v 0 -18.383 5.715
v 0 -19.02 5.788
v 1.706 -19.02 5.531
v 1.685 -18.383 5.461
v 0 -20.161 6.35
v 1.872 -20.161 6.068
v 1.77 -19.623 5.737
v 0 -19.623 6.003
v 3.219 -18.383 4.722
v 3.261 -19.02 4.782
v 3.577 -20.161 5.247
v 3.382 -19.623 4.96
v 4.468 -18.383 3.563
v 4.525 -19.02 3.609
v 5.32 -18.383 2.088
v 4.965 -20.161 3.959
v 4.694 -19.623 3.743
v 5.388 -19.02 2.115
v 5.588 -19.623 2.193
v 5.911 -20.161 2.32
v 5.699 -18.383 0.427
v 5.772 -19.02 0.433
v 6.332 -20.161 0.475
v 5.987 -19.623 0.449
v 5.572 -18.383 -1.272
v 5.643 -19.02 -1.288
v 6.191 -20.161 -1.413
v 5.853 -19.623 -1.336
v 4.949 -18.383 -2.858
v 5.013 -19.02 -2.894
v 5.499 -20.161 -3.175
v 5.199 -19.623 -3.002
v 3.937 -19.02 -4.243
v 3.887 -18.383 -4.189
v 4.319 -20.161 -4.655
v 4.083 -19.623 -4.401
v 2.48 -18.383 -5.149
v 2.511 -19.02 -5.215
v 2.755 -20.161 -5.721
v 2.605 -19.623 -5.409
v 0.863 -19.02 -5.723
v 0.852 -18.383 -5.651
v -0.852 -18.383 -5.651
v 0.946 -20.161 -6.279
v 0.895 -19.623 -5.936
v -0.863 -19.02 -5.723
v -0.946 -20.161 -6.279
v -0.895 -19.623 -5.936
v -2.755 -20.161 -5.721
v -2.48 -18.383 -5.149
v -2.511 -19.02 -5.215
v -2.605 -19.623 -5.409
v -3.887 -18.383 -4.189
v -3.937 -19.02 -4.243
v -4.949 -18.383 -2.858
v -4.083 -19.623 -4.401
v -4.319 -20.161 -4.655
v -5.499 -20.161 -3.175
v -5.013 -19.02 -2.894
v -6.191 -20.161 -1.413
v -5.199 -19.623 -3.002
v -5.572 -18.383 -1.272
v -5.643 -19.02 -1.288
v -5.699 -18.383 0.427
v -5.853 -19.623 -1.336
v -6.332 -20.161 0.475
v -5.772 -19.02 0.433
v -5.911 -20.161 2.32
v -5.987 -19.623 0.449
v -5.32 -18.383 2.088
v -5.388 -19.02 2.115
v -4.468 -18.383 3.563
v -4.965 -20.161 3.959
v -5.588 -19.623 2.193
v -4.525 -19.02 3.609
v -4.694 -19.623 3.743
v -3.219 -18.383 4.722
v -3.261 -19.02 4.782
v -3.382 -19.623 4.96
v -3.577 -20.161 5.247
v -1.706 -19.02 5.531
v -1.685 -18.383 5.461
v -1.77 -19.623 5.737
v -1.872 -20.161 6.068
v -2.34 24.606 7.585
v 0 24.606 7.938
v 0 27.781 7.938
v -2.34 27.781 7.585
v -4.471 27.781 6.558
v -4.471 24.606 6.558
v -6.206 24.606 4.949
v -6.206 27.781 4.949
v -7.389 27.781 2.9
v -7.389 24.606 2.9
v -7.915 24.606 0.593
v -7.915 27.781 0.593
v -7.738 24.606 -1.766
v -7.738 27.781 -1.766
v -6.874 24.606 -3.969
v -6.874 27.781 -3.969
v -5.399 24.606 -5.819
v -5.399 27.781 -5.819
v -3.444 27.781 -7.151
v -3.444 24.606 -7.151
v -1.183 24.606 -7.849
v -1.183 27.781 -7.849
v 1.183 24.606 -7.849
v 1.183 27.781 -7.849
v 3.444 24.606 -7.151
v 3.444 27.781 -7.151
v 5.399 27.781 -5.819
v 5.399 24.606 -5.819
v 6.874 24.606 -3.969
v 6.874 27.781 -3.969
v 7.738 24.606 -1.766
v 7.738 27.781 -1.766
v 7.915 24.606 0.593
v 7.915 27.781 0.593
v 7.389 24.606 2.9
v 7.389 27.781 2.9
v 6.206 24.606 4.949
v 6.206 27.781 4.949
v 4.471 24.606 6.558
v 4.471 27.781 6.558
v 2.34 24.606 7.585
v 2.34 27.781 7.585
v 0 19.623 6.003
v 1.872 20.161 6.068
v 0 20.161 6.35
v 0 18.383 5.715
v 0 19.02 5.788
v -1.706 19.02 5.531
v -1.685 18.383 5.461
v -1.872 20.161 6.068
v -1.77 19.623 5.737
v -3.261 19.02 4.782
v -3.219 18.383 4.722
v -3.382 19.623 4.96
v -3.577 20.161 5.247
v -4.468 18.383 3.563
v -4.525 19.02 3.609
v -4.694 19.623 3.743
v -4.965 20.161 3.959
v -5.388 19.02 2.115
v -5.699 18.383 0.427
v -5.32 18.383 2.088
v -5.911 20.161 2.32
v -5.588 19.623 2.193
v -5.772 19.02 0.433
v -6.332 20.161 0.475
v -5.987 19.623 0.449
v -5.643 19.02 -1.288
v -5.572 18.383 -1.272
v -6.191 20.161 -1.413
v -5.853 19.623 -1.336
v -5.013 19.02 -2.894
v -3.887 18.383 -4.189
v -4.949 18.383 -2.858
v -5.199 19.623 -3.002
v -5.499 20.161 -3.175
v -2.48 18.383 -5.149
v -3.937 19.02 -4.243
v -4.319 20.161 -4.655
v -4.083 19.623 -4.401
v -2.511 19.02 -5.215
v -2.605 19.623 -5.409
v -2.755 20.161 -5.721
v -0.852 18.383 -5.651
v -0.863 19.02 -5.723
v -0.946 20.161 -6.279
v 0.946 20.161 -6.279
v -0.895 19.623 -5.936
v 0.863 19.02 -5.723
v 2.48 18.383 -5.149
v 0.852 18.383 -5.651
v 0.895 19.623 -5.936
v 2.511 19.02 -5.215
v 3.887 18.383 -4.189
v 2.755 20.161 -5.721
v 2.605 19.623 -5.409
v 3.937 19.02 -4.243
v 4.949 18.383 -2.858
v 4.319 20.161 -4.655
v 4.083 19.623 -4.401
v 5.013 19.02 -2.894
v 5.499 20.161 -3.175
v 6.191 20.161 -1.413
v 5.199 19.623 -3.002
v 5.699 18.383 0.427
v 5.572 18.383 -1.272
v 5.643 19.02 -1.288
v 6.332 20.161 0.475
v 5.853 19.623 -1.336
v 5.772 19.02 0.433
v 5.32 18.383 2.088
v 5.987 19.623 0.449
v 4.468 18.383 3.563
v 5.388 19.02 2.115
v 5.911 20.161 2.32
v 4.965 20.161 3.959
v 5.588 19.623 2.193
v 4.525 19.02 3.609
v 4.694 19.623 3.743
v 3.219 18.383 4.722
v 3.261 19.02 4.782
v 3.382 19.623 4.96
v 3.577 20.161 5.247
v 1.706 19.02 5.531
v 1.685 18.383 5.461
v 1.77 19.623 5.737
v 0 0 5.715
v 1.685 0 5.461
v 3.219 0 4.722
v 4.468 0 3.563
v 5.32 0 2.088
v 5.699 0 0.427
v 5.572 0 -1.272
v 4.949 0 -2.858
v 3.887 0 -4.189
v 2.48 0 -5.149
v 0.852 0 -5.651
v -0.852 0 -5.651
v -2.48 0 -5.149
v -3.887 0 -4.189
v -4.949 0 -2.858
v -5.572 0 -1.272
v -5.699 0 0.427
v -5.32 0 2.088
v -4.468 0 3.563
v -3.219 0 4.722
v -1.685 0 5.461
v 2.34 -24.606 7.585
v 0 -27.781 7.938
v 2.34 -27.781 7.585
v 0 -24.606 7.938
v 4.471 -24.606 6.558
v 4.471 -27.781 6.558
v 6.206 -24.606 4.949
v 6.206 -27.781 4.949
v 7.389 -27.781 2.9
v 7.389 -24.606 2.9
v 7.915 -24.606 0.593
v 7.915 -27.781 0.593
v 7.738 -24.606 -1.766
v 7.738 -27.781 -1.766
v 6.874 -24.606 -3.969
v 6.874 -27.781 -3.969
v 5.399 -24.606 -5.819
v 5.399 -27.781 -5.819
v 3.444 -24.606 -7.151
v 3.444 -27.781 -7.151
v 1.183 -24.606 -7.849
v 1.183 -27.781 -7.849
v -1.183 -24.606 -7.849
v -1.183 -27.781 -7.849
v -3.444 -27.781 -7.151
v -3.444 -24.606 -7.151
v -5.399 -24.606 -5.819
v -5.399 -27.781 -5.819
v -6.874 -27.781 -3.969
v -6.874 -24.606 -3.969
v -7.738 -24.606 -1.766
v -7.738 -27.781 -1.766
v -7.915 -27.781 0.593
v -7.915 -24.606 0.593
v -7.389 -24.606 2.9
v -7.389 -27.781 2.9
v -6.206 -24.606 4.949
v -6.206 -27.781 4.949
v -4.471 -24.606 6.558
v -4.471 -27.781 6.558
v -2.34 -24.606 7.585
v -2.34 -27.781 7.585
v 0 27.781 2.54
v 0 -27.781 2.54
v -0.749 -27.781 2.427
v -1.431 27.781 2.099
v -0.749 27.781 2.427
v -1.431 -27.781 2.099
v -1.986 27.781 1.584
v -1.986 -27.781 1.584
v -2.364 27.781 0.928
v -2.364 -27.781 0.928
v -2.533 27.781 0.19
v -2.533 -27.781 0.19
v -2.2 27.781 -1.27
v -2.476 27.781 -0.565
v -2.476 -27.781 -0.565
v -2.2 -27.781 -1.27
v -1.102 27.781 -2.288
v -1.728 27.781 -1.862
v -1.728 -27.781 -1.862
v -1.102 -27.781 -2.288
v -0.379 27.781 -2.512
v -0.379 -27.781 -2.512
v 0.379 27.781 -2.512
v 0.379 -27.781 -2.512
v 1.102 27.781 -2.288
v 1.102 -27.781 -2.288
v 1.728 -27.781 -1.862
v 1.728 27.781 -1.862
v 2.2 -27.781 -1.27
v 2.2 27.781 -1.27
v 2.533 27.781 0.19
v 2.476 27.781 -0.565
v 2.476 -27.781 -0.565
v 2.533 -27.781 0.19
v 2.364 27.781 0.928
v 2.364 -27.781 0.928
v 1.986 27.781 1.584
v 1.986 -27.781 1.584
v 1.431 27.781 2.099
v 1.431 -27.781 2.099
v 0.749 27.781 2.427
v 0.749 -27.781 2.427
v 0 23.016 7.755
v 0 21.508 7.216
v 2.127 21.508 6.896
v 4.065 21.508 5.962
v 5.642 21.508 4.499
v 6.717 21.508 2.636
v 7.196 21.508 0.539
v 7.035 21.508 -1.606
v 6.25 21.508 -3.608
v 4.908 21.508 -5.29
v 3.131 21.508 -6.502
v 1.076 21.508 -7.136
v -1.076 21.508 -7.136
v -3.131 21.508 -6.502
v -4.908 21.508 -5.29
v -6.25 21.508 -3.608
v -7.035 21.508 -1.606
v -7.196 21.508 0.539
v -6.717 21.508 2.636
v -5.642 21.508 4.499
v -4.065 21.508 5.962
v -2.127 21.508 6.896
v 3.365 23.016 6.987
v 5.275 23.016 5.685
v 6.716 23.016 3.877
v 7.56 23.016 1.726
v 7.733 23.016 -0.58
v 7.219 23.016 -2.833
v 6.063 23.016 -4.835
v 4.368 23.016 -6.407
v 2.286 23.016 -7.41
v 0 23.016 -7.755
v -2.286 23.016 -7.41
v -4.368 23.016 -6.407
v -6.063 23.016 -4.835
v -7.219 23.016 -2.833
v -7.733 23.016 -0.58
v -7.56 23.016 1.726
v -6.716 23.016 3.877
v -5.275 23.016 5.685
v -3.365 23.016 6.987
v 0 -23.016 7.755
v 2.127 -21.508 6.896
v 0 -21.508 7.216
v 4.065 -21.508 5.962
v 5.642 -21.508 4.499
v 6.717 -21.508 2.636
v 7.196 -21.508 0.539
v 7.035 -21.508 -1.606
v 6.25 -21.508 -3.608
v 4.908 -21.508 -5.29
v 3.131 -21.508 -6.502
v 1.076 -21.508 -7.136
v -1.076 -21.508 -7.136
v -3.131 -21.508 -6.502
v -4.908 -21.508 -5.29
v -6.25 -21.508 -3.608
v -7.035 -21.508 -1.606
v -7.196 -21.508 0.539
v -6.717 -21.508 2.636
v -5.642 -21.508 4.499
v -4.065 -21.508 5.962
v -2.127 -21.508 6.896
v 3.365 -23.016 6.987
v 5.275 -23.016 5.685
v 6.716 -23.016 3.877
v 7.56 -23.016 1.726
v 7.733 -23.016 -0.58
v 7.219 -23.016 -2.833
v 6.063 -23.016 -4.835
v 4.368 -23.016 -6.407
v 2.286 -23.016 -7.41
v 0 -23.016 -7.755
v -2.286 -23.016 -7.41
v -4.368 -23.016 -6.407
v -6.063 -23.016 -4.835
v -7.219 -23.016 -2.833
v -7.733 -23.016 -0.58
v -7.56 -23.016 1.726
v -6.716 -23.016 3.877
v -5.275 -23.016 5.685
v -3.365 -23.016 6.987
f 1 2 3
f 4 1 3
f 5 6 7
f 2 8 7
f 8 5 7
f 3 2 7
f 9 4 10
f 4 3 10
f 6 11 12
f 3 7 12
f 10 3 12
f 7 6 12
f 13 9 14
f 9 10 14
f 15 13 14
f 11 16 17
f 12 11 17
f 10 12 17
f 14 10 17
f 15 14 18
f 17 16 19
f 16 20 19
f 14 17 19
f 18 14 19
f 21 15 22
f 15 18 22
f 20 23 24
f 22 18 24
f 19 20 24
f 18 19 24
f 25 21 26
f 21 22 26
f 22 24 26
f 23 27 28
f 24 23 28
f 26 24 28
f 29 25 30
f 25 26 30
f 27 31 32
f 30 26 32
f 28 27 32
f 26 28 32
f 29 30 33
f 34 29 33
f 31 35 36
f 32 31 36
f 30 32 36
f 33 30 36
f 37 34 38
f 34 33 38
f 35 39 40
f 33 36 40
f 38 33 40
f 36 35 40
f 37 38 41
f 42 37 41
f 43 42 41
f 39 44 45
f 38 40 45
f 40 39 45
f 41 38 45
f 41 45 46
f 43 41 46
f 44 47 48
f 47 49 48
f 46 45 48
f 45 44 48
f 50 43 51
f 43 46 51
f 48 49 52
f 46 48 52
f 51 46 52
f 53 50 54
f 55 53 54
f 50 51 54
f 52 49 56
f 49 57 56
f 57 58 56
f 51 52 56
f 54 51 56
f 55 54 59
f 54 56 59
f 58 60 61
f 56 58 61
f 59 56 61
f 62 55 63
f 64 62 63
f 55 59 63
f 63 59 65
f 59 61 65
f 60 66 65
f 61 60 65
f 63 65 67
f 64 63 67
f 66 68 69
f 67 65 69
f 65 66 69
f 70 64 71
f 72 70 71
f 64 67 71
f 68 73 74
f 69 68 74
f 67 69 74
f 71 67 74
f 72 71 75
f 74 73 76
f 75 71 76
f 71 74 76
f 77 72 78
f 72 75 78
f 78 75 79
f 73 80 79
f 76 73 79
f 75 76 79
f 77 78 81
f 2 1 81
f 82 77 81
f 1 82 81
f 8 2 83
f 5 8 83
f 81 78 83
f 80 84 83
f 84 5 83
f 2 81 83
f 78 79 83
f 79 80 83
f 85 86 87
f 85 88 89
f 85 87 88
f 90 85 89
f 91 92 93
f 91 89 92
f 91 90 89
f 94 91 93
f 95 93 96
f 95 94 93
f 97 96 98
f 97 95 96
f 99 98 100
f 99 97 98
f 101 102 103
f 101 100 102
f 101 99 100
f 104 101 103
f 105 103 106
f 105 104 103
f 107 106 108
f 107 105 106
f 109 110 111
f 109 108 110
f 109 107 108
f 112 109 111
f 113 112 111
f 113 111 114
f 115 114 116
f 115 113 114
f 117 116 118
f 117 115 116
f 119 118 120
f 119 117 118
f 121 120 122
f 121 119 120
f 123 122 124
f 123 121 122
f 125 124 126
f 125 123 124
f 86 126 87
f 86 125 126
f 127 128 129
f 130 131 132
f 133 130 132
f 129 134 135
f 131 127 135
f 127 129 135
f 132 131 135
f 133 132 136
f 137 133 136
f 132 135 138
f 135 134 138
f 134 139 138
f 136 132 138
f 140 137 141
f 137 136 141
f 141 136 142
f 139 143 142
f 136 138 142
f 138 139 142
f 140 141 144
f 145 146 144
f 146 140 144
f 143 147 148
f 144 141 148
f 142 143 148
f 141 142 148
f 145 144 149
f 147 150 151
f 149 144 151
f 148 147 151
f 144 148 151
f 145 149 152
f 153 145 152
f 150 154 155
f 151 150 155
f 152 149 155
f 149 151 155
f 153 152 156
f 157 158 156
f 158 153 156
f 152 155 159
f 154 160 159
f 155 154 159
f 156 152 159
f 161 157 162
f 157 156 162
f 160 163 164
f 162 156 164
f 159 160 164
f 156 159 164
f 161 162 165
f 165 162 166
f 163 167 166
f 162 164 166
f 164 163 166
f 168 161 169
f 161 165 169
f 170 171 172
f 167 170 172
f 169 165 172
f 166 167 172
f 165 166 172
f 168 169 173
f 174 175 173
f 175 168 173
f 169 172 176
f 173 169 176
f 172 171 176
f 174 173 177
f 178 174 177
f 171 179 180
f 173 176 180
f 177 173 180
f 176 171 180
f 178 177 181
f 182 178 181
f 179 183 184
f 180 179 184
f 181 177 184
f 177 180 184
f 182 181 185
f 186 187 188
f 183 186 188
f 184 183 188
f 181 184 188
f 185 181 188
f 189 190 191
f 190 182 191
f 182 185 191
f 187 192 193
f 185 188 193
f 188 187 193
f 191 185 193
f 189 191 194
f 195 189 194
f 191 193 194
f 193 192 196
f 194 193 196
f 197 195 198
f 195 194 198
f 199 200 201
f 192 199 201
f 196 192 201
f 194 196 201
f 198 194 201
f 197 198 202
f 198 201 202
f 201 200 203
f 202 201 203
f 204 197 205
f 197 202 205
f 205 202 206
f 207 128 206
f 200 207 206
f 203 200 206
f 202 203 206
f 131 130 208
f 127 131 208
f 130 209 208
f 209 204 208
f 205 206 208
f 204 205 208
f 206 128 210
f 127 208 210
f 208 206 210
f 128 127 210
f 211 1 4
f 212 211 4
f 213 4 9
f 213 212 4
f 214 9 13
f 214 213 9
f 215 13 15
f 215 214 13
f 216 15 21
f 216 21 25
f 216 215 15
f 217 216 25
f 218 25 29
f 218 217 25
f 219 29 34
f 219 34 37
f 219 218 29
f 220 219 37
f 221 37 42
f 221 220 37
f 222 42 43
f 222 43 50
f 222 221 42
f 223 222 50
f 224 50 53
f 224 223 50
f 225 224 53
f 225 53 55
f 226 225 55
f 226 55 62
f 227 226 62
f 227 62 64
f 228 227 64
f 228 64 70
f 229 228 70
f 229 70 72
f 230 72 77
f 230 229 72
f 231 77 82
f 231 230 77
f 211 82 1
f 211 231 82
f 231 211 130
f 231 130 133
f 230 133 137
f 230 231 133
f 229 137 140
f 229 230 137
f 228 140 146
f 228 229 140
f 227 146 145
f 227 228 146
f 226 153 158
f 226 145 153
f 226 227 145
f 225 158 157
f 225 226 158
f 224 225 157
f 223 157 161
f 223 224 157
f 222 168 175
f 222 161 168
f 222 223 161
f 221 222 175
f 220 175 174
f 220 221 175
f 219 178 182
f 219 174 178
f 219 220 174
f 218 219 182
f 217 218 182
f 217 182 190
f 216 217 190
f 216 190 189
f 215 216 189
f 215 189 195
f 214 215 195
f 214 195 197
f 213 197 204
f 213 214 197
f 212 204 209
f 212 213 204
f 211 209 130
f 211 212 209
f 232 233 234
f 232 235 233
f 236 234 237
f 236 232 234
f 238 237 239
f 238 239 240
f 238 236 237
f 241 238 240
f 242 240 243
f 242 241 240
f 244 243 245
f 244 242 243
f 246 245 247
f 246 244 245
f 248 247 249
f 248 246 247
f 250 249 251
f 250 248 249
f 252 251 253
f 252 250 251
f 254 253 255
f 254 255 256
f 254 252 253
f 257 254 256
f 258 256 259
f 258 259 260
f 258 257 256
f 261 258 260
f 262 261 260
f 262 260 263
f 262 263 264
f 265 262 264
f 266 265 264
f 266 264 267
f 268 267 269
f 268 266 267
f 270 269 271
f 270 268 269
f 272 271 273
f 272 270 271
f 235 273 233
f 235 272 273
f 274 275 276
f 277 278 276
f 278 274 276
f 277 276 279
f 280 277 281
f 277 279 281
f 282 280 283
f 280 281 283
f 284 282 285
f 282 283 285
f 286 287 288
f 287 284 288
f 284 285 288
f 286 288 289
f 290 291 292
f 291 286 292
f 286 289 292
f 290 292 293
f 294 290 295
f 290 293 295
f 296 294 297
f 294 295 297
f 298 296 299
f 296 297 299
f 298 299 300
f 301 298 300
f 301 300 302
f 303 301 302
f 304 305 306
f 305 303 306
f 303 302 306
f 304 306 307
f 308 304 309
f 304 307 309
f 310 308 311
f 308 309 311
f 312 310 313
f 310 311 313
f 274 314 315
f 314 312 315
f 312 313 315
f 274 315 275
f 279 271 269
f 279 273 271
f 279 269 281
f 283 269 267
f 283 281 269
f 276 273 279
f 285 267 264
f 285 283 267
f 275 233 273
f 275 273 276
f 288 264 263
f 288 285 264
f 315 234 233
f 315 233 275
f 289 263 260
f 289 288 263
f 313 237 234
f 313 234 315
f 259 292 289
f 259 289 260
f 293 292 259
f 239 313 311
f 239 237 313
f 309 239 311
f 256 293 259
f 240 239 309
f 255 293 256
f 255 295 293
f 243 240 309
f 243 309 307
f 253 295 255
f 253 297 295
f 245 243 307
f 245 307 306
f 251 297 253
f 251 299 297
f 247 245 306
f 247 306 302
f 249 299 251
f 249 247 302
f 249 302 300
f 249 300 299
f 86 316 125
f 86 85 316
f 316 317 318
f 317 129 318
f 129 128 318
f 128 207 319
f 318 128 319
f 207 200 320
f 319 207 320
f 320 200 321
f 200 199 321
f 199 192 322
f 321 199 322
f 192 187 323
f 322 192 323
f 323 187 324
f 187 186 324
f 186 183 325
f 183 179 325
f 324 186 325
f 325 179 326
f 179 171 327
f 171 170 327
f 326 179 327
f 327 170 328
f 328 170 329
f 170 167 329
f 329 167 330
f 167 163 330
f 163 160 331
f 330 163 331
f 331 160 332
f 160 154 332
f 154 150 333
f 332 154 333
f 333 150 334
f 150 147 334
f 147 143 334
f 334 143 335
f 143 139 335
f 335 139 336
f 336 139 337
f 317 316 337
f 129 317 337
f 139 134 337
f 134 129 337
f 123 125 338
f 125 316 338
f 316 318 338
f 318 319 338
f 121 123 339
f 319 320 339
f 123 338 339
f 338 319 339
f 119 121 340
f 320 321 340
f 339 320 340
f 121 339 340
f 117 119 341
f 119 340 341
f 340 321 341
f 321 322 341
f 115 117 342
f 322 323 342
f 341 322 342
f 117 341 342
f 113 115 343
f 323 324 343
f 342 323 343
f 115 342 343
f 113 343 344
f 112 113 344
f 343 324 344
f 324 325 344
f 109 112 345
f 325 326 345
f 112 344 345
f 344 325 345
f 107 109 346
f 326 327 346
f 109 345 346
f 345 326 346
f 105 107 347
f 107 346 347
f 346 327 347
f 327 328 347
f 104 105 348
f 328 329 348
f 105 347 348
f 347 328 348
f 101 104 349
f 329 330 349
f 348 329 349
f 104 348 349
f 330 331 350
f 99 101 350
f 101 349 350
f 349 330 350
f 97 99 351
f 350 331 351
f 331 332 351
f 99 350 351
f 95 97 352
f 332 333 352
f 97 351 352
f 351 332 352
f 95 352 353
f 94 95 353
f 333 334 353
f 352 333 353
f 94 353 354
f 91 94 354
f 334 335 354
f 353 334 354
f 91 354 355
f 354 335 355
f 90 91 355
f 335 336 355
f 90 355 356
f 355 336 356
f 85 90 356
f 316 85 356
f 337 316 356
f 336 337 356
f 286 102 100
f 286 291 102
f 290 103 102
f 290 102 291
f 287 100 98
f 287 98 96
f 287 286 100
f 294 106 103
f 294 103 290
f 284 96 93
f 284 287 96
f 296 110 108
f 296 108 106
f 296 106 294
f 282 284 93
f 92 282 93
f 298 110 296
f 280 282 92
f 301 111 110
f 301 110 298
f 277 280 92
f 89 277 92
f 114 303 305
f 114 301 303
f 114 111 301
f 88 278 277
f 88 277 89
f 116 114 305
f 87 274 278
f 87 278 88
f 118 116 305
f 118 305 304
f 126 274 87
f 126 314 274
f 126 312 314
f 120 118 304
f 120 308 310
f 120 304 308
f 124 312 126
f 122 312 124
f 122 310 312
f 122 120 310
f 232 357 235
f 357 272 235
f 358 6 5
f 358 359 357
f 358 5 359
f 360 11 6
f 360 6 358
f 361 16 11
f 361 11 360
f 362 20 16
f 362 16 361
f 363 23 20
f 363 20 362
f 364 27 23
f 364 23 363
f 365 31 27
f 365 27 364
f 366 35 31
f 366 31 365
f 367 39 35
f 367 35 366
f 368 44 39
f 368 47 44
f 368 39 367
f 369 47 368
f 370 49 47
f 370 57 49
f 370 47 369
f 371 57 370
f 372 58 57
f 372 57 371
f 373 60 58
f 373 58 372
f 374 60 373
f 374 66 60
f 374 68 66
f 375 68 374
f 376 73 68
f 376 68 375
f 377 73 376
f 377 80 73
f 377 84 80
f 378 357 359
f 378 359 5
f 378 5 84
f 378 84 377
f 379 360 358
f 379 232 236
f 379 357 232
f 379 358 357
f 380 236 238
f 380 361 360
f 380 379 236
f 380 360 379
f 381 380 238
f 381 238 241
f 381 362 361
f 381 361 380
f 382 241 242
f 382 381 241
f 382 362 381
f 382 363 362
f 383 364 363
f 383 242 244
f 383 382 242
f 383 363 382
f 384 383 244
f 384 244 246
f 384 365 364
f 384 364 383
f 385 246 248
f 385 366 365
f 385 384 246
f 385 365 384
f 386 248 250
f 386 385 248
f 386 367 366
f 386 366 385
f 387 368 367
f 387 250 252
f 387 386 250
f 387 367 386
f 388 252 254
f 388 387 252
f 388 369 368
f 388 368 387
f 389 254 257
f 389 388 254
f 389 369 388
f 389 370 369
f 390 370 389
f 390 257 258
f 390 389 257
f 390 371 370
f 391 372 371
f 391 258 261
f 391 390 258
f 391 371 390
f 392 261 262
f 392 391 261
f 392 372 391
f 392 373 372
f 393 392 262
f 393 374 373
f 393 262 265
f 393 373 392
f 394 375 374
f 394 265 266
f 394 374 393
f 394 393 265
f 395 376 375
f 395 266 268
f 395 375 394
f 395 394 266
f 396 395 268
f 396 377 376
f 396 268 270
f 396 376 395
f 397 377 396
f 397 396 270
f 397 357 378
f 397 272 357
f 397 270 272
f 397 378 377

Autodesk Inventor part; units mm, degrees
ref_plane "YZ Plane" through (0, 0, 0) normal (1, 0, 0) x (0, 1, 0)
ref_plane "XZ Plane" through (0, 0, 0) normal (0, 1, 0) x (-1, 0, 0)
ref_plane "XY Plane" through (0, 0, 0) normal (0, 0, 1) x (1, 0, 0)
sketch "Sketch1" plane through (0, 0, 0) normal (1, 0, 0) x (0, 1, 0)
  line L0 (27.7812, 2.54) -> (0, 2.54)
  line L1 (-5.5563, 0) -> (33.3375, 0) projected
  line L2 (27.7812, 2.54) -> (27.7812, 7.9375)
  line L3 (0, 10.226) -> (0, -1.7043) projected
  line L4 (27.7812, 7.9375) -> (24.6063, 7.9375)
  line L5 (27.7812, 5.715) -> (0, 5.715)
  arc A0 (24.6063, 7.9375) -> (20.1613, 6.35) centre (24.6063, 0.9208) ccw
  arc A1 (18.3833, 5.715) -> (20.1613, 6.35) centre (18.3833, 8.5217) ccw
  point P0 (0, 0)
  dimension "d0" = 2.54
  dimension "d2" = 27.7812
  dimension "d3" = 3.175
  dimension "d5" = 3.175
  dimension "d6" = 7.62
  dimension "d9" = 7.9375
  dimension "d10" = 1.5875
revolve "Revolution1" add sketch "Sketch1" angle 360 about axis through (0, 0, 0) along (0, 1, 0)
mirror "Mirror1" about plane through (0, 0, 5.715) normal (0, -1, 0) of "Revolution1"
properties part number "Bolt_Spacer" material "ABS Plastic"
